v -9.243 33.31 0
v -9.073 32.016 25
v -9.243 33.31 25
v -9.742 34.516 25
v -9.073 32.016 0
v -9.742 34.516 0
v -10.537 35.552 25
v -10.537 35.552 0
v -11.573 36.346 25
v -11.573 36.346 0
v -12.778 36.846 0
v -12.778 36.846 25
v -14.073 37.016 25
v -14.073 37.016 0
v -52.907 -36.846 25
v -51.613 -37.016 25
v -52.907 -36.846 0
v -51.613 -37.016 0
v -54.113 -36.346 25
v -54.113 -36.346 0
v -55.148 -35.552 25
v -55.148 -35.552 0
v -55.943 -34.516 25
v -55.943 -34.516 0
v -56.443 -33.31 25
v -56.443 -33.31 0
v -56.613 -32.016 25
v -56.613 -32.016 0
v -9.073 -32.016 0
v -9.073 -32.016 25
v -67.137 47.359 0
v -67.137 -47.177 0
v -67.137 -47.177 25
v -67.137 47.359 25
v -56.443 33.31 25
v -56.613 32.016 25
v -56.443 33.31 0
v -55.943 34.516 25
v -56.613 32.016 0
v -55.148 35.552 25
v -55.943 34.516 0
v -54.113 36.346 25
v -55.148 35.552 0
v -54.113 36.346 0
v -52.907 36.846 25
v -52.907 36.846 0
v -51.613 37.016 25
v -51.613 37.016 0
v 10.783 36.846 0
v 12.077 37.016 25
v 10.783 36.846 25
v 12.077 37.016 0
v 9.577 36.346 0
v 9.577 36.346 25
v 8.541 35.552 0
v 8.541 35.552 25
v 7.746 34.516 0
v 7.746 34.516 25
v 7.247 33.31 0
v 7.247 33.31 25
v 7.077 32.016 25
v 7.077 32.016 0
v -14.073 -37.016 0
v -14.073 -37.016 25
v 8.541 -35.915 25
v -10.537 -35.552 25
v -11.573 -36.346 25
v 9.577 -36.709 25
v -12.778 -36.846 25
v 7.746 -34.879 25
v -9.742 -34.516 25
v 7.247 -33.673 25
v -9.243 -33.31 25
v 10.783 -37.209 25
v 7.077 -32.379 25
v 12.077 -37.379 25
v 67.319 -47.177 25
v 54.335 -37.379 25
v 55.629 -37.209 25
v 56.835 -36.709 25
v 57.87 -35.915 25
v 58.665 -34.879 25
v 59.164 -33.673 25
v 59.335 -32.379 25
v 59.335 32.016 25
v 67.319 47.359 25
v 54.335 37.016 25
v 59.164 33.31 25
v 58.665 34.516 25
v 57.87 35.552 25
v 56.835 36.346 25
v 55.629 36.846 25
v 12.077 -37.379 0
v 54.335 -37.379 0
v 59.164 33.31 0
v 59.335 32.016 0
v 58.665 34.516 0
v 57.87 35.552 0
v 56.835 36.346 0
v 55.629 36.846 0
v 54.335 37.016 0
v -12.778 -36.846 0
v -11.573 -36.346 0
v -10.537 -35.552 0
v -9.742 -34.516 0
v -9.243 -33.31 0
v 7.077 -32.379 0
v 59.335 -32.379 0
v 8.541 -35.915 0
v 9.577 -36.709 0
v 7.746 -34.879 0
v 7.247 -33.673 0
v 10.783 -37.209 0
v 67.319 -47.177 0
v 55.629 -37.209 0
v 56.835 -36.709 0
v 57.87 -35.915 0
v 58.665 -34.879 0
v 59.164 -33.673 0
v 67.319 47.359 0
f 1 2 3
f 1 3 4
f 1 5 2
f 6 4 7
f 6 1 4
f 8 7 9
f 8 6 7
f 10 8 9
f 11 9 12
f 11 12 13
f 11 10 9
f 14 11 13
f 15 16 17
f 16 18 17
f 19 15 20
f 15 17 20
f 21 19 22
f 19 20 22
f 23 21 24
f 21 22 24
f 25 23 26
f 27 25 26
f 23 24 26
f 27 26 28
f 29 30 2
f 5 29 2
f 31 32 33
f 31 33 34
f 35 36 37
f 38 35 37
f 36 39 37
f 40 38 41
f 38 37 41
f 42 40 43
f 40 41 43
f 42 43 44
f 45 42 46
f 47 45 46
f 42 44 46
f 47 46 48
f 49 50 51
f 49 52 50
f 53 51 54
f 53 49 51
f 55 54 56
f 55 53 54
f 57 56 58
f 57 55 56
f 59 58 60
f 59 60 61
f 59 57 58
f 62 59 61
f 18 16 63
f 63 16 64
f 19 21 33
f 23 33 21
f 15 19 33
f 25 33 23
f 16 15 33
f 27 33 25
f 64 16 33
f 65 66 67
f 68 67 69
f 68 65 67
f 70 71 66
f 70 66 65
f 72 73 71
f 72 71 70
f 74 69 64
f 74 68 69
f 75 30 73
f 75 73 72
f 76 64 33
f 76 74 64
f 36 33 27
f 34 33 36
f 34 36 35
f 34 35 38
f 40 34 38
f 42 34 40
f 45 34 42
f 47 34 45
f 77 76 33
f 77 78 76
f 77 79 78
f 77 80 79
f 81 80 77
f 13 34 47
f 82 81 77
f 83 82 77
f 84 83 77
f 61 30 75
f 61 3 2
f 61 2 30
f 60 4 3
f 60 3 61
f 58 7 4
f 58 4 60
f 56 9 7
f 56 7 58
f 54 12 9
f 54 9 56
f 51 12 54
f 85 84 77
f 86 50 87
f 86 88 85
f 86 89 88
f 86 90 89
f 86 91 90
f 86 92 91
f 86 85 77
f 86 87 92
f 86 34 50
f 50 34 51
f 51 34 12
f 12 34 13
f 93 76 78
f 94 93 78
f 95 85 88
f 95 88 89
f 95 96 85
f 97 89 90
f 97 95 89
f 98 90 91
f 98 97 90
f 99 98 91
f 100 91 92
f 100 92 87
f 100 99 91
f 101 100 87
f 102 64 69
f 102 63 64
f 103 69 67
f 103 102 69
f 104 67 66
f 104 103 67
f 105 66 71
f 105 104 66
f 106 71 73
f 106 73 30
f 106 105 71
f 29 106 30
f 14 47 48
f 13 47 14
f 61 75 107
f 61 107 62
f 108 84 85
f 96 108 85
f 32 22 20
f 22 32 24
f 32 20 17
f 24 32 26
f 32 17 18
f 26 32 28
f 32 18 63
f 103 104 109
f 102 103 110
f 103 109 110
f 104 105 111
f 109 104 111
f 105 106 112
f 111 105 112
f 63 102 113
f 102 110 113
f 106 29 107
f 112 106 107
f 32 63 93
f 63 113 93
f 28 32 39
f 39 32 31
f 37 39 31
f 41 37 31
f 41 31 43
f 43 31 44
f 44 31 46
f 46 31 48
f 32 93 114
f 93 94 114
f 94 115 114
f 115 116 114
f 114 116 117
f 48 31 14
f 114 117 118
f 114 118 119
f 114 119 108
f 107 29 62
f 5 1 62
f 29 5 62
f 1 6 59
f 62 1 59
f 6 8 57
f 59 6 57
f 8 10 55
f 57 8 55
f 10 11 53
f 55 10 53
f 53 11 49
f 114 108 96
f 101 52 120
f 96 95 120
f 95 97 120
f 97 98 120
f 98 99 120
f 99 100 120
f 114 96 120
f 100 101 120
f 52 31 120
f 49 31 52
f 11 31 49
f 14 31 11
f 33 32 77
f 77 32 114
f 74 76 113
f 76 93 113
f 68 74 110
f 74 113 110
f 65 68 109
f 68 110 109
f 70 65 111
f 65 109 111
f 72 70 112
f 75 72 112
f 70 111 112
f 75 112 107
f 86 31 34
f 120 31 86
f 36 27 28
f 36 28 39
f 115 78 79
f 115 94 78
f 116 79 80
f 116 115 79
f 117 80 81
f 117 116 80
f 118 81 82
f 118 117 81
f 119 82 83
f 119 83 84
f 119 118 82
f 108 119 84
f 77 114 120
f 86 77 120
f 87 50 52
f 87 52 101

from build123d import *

# Parameters (mm, degrees)
F0_W     = 134.455651
F0_H     = 94.536297
F1_DEPTH = 25
F2_W     = 47.540324
F2_H     = 74.032262
F3_DEPTH = 25
F2_W_2   = 52.258067
F2_H_2   = 74.395165
F4_DEPTH = 25
F5_R     = 5


with BuildPart() as f1:
    # F0 (on Top) → F1 (new body)
    with BuildSketch(Plane.XY):
        with Locations((0.090725, 0.090726)):
            Rectangle(F0_W, F0_H)
    extrude(amount=F1_DEPTH)

    # F2 (on face) → F3 (cut)
    with BuildSketch(Plane.XY.offset(25)):
        with Locations((-32.842743, 0)):
            Rectangle(F2_W, F2_H)
    extrude(amount=-F3_DEPTH, mode=Mode.SUBTRACT)

    # F2 (on face) → F4 (cut)
    with BuildSketch(Plane.XY.offset(25)):
        with Locations((-32.842743, 0)):
            Rectangle(F2_W, F2_H)
        with Locations((33.205647, -0.181451)):
            Rectangle(F2_W_2, F2_H_2)
    extrude(amount=-F4_DEPTH, mode=Mode.SUBTRACT)

    # F5
    f5_edges = [f1.edges().sort_by_distance(p)[0] for p in [
        (-56.612905, 37.016131, 12.5),
        (-9.072581, 37.016131, 12.5),
        (-56.612905, -37.016131, 12.5),
        (-9.072581, -37.016131, 12.5),
        (7.076613, -37.379034, 12.5),
        (7.076613, 37.016131, 12.5),
        (59.33468, 37.016131, 12.5),
        (59.33468, -37.379034, 12.5),
    ]]
    fillet(f5_edges, radius=F5_R)


solid = f1.part
